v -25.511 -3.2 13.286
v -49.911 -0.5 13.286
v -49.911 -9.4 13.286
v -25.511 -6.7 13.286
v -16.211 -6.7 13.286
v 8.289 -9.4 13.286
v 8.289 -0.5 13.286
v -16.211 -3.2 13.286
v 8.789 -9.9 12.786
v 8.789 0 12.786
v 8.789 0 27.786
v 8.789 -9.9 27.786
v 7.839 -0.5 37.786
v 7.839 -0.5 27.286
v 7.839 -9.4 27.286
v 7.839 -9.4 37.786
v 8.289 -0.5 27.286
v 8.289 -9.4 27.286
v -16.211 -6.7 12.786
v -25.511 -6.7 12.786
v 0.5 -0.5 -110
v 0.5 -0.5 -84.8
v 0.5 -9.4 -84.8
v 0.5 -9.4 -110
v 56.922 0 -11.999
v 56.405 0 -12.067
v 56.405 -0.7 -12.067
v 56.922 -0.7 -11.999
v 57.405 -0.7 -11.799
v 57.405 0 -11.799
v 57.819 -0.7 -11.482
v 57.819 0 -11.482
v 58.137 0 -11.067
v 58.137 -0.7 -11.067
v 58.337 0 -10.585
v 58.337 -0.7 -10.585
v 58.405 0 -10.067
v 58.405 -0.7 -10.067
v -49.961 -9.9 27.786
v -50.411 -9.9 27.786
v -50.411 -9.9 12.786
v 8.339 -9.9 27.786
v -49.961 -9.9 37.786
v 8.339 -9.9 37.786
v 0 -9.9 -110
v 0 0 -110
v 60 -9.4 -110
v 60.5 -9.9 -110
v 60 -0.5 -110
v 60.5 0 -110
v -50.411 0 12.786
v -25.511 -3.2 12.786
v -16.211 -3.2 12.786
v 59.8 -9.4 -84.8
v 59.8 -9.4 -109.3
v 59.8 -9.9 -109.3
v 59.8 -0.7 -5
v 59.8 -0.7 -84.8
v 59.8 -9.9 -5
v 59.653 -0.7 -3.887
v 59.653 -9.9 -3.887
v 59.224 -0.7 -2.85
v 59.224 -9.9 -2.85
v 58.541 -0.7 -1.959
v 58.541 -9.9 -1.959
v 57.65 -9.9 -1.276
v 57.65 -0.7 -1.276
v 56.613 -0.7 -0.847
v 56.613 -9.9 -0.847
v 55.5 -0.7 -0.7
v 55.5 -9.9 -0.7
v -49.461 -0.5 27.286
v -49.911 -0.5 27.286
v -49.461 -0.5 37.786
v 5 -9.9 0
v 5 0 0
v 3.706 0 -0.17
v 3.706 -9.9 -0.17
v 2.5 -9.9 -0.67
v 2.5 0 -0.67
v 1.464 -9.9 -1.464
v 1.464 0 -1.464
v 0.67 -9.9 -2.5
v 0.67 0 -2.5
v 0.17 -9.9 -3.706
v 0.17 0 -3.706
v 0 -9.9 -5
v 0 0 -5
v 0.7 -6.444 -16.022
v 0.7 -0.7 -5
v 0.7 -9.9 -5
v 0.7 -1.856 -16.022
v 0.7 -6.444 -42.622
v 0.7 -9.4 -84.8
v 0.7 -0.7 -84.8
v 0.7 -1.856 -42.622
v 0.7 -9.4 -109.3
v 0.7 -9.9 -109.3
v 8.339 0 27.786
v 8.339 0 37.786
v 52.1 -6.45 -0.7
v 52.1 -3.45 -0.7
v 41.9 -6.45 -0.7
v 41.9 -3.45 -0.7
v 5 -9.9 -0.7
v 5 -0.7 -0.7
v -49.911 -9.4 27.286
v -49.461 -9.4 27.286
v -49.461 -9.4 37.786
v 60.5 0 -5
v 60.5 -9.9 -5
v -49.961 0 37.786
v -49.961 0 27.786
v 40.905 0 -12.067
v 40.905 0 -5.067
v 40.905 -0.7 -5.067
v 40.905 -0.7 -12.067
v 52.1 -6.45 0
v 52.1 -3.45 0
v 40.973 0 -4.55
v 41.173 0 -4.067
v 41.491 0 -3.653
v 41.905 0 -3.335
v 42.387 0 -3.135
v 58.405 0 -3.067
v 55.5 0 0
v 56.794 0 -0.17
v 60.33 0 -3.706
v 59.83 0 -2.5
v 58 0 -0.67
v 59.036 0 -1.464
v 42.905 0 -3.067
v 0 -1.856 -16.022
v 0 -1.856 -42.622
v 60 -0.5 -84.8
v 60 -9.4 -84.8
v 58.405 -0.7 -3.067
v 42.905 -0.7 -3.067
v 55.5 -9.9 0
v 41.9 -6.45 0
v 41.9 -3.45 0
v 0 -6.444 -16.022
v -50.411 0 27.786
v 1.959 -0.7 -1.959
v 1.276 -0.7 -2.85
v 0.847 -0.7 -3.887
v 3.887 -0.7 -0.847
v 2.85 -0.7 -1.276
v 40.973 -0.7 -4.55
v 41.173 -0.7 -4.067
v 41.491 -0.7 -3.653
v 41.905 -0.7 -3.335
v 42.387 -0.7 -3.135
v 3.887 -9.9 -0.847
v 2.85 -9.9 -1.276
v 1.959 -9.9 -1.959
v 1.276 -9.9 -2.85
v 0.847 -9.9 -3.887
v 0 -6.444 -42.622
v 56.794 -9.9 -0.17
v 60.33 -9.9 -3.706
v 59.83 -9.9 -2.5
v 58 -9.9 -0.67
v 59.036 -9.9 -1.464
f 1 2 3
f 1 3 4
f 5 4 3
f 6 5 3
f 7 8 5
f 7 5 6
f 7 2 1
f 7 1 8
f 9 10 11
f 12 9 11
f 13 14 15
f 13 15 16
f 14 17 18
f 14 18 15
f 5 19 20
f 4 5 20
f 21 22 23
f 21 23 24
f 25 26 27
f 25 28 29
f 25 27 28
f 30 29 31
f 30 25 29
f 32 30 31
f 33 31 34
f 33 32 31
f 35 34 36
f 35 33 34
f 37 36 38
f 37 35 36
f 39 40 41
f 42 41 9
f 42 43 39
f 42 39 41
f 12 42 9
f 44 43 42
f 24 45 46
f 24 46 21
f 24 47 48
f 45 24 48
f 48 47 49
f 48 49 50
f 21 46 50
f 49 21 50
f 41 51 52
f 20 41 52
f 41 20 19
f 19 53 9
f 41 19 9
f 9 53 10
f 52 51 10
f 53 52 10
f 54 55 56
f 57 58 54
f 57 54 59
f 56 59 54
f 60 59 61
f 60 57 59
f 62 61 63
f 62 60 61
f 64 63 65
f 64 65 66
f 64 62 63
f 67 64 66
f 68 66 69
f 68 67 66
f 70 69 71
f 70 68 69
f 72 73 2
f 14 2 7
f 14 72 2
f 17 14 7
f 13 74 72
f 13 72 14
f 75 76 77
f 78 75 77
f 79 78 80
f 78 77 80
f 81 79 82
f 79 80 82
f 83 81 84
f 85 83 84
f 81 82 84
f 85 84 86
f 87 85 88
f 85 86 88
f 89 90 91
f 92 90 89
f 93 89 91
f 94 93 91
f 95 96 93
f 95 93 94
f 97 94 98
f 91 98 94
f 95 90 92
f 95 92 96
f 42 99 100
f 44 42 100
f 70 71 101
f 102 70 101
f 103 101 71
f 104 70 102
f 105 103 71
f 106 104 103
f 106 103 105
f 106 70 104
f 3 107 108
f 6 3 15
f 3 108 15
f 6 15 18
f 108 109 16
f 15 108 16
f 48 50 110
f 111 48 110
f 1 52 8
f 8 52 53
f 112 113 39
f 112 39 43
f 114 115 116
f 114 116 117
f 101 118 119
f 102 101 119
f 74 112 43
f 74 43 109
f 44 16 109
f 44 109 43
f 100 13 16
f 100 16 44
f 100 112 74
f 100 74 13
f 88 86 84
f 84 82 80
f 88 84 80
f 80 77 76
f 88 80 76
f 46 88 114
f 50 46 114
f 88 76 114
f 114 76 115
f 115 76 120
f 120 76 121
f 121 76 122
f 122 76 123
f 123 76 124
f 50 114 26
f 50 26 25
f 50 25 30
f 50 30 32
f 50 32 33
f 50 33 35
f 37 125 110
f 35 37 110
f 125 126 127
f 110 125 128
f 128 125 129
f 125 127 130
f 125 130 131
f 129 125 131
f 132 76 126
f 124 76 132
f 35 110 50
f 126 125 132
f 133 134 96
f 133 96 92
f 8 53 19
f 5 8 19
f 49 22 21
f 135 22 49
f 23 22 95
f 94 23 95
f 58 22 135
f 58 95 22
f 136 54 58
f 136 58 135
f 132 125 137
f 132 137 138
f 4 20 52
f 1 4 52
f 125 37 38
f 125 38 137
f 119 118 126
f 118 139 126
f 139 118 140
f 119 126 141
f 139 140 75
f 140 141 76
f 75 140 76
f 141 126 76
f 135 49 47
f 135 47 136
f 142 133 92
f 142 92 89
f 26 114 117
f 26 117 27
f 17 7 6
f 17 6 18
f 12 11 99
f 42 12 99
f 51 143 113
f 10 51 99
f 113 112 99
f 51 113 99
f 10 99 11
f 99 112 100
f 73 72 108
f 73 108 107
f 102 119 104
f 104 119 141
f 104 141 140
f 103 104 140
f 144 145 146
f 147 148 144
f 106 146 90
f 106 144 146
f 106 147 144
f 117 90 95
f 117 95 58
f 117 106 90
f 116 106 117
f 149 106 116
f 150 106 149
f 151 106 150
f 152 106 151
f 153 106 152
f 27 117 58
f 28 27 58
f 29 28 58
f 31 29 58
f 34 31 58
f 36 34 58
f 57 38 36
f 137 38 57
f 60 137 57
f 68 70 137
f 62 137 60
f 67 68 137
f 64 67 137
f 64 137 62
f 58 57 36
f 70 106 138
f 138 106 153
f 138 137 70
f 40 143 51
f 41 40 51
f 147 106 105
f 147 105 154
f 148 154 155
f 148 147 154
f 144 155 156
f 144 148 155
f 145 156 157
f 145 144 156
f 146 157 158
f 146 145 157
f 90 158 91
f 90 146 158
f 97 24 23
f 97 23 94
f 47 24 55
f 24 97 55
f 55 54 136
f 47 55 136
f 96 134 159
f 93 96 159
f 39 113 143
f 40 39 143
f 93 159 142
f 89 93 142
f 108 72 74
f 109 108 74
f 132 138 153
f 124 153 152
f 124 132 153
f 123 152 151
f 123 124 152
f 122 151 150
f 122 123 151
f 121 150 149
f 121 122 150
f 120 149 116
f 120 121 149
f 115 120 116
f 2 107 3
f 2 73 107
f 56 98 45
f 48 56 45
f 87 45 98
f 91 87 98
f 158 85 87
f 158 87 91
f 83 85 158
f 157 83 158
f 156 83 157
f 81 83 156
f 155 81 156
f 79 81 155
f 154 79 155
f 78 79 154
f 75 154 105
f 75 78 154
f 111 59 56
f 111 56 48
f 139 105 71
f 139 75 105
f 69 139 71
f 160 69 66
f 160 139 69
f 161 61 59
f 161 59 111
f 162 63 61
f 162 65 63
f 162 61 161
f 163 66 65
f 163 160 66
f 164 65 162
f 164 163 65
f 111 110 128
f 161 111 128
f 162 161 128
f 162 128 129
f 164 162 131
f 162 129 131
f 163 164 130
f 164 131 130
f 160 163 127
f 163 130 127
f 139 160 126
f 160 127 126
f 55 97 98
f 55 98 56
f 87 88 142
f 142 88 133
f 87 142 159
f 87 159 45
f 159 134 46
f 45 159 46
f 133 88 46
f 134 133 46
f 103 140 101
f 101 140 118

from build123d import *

# Parameters (mm, degrees)
F2_DEPTH  = 9.9
F3_T      = -0.7
F4_T      = -0.5
F5_DEPTH  = 25
F6_W      = 4.588274518
F6_H      = 26.6
F7_DEPTH  = 25
F8_W      = 59.5
F8_H      = 8.9
F9_DEPTH  = 25
F11_DEPTH = 25
F12_W     = 58.3
F12_H     = 10
F13_DEPTH = 9.9
F14_T     = -0.5
F16_DEPTH = 25


with BuildPart() as f2:
    # F0 (on Front) → F2 (new body)
    with BuildSketch(Plane.XZ):
        with BuildLine():
            Line((55.5, 0), (5, 0))
            ThreePointArc((5, 0), (1.4644660941, -1.4644660941), (0, -5))
            Line((0, -5), (0, -110))
            Line((0, -110), (60.5, -110))
            Line((60.5, -110), (60.5, -5))
            ThreePointArc((60.5, -5), (59.0355339059, -1.4644660941), (55.5, 0))
        make_face()
    extrude(amount=F2_DEPTH)

    # F3
    f3_openings = [f2.faces().sort_by_distance(p)[0] for p in [
        (30.25, -9.9, -55.087018),
    ]]
    offset(amount=F3_T, openings=f3_openings)

    # F4
    f4_openings = [f2.faces().sort_by_distance(p)[0] for p in [
        (30.25, -4.95, -110),
    ]]
    offset(amount=F4_T, openings=f4_openings, kind=Kind.INTERSECTION)

    # F1 (on Front) → F5 (cut)
    with BuildSketch(Plane.XZ):
        with BuildLine():
            Line((58.4048116207, -10.0673367828), (58.4048116207, -3.0673367828))
            Line((58.4048116207, -3.0673367828), (42.9048116207, -3.0673367828))
            ThreePointArc((42.9048116207, -3.0673367828), (41.4905980583, -3.6531232204), (40.9048116207, -5.0673367828))
            Line((40.9048116207, -5.0673367828), (40.9048116207, -12.0673367828))
            Line((40.9048116207, -12.0673367828), (56.4048116207, -12.0673367828))
            ThreePointArc((56.4048116207, -12.0673367828), (57.8190251831, -11.4815503452), (58.4048116207, -10.0673367828))
        make_face()
    extrude(amount=F5_DEPTH, mode=Mode.SUBTRACT)

    # F6 (on face) → F7 (cut)
    with BuildSketch(Plane(origin=(0, 0, 0), x_dir=(0, -1, 0), z_dir=(-1, 0, 0))):
        with Locations((4.1498298524, -29.3223166287)):
            Rectangle(F6_W, F6_H)
    extrude(amount=-F7_DEPTH, mode=Mode.SUBTRACT)

    # F8 (on face) → F9 (cut)
    with BuildSketch(Plane(origin=(0, 0, -109.8), x_dir=(1, 0, 0), z_dir=(0, 0, -1))):
        with Locations((30.25, 4.95)):
            Rectangle(F8_W, F8_H)
    extrude(amount=-F9_DEPTH, mode=Mode.SUBTRACT)

    # F10 (on face) → F11 (cut)
    with BuildSketch(Plane.XY):
        Polygon((52.1, -6.45), (52.1, -4.95), (52.1, -3.45), (41.9, -3.45), (41.9, -6.45), align=None)
    extrude(amount=-F11_DEPTH, mode=Mode.SUBTRACT)


with BuildPart() as f13:
    # F12 (on Front) → F13 (new body)
    with BuildSketch(Plane.XZ):
        Polygon((-50.4111871123, 12.7860568464), (8.7888128877, 12.7860568464), (8.7888128877, 27.7860568464), (8.3388128877, 27.7860568464), (-49.9611871123, 27.7860568464), (-50.4111871123, 27.7860568464), align=None)
        with Locations((-20.8111871123, 32.7860568464)):
            Rectangle(F12_W, F12_H)
    extrude(amount=F13_DEPTH)

    # F14
    f14_openings = [f13.faces().sort_by_distance(p)[0] for p in [
        (-20.811187, -4.95, 37.786057),
    ]]
    offset(amount=F14_T, openings=f14_openings, kind=Kind.INTERSECTION)

    # F15 (on face) → F16 (cut)
    with BuildSketch(Plane(origin=(0, 0, 12.7860568464), x_dir=(1, 0, 0), z_dir=(0, 0, -1))):
        Polygon((-25.5111871123, 6.7), (-25.5111871123, 5), (-25.5111871123, 3.2), (-16.2111871123, 3.2), (-16.2111871123, 4.9), (-16.2111871123, 6.7), align=None)
    extrude(amount=-F16_DEPTH, mode=Mode.SUBTRACT)


solid = Compound([f2.part, f13.part])
